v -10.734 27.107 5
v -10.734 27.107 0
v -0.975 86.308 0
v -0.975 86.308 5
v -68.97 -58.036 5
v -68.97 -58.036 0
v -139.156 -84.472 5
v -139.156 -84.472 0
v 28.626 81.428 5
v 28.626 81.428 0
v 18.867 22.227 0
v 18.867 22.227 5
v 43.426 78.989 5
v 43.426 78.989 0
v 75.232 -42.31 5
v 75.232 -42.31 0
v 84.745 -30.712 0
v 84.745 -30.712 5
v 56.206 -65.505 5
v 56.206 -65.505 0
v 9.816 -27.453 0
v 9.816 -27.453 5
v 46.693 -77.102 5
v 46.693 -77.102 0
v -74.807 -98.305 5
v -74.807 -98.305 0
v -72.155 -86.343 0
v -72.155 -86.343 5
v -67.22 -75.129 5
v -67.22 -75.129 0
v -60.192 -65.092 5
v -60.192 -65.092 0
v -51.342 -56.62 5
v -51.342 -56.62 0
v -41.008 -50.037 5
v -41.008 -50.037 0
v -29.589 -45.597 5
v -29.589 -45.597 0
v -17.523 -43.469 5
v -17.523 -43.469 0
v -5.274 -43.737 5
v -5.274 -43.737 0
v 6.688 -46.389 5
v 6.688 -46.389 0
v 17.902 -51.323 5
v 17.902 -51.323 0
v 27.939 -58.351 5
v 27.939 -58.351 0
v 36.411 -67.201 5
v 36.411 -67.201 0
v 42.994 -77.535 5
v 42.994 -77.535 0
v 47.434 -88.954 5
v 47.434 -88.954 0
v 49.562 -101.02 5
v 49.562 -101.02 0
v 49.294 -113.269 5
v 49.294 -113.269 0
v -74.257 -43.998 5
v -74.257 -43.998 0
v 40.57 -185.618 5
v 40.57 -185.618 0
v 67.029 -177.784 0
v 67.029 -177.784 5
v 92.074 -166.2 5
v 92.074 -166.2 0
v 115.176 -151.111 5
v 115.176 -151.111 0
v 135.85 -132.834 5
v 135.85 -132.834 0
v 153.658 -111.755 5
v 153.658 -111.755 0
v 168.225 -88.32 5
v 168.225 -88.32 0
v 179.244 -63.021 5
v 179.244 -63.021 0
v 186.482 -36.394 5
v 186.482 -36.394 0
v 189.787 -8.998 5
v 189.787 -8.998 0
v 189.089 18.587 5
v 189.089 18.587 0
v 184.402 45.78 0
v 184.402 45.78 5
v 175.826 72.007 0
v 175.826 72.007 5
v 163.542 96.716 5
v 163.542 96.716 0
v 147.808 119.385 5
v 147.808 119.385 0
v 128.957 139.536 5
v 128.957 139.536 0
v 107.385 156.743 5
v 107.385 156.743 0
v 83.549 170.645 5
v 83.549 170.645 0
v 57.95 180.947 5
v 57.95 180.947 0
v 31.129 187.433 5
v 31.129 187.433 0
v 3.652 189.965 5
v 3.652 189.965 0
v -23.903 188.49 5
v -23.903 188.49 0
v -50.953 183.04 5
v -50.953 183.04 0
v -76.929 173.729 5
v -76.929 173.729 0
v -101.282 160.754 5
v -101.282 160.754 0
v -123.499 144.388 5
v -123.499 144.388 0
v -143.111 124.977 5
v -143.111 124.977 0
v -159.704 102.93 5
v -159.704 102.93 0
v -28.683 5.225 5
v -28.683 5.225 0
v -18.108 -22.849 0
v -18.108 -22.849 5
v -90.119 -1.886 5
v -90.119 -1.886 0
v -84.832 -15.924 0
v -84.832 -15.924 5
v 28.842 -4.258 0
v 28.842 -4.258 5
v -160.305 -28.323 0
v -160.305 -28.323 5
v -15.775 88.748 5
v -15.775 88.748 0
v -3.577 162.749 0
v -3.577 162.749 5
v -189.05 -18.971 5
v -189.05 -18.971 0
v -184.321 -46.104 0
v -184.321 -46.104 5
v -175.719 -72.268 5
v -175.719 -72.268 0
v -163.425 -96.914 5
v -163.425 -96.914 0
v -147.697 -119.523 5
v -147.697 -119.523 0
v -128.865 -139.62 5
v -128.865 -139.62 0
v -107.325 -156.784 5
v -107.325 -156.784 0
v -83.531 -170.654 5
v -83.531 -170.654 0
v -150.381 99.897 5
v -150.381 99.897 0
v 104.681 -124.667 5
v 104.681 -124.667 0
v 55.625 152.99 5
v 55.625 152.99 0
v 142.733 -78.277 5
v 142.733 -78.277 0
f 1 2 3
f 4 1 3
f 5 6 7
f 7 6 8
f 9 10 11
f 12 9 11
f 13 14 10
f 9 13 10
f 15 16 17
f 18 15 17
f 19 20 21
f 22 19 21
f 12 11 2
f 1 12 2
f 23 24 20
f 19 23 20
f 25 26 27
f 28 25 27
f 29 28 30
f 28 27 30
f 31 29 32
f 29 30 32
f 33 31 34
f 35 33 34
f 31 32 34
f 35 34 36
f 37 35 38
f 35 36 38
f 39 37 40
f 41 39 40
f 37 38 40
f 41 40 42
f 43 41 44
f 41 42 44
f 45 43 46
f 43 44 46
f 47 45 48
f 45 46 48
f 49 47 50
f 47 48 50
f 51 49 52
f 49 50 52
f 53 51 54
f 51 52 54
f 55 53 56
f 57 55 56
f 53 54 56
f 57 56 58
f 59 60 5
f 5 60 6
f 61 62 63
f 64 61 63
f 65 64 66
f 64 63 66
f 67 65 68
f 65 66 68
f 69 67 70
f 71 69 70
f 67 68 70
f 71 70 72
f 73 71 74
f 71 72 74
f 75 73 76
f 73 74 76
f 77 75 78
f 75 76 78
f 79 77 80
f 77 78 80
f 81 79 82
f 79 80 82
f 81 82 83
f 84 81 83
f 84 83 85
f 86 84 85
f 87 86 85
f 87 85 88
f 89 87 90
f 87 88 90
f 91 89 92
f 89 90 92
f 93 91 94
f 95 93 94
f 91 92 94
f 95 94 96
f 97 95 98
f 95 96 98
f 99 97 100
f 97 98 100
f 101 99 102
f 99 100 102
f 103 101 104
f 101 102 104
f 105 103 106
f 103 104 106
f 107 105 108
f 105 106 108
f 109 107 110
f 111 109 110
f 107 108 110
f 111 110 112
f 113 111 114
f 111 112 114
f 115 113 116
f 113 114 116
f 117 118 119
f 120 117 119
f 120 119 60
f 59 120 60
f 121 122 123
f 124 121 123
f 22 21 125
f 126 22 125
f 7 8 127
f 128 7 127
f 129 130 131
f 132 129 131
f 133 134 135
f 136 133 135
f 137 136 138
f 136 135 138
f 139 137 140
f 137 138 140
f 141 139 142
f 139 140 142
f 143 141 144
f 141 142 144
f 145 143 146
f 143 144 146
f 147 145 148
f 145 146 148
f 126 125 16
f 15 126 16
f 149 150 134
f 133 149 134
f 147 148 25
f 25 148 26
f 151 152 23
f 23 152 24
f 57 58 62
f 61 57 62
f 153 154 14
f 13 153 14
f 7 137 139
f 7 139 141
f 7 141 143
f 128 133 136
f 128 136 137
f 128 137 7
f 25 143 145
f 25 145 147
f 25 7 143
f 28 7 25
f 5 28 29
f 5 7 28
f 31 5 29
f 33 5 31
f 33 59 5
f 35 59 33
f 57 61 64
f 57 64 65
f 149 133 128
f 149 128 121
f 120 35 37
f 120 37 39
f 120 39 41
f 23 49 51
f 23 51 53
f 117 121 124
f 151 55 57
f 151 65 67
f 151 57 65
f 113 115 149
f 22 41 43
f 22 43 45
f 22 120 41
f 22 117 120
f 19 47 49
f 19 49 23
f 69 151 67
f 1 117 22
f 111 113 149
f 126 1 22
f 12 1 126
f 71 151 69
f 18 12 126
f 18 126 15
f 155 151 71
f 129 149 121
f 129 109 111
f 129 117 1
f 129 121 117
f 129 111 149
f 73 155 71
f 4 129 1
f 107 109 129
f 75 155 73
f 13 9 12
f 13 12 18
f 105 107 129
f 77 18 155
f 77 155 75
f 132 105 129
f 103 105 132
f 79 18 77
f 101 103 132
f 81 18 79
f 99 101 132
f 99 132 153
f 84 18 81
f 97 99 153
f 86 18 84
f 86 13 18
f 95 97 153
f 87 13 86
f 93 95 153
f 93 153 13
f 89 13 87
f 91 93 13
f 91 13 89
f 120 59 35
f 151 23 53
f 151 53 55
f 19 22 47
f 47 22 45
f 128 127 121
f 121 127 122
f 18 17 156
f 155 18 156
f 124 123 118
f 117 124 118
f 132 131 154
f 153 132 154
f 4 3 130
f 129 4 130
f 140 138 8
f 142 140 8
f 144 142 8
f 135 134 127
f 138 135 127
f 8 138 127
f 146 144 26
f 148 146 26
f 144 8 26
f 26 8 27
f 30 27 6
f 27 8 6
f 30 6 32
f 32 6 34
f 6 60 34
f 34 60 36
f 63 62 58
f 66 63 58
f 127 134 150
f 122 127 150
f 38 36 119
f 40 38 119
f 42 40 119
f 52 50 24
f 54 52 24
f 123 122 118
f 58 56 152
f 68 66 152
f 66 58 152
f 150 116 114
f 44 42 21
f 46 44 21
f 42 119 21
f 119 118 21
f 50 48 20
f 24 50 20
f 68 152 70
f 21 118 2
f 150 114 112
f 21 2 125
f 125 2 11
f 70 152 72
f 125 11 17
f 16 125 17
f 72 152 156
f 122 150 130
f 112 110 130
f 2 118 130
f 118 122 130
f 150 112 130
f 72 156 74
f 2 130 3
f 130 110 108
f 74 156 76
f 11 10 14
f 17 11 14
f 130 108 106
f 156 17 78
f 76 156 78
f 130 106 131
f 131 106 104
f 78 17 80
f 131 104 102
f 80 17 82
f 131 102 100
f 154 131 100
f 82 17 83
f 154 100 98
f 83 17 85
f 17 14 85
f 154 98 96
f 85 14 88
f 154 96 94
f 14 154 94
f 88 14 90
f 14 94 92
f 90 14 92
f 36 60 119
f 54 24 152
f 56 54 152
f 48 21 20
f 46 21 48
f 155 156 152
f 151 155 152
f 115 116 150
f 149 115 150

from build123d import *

# Parameters (mm, degrees)
BOSS_EXTRUDE1_DEPTH = 5


with BuildPart() as part:
    # Sketch1 → Boss-Extrude1 (new body)
    with BuildSketch(Plane.XY):
        with BuildLine():
            Line((-83.530674823, -170.653527252), (-74.806628793, -98.304799508))
            ThreePointArc((-74.806628793, -98.304799508), (-5.273873885, -43.7365304), (49.294395236, -113.269285297))
            Line((49.294395236, -113.269285297), (40.570349206, -185.618013041))
            ThreePointArc((40.570349206, -185.618013041), (156.087114581, 108.336571211), (-159.704253129, 102.929837912))
            Line((-159.704253129, 102.929837912), (-150.380705265, 99.896734946))
            Line((-150.380705265, 99.896734946), (-189.050478899, -18.971463523))
            ThreePointArc((-189.050478899, -18.971463523), (-155.971098141, -108.503532406), (-83.530674823, -170.653527252))
        make_face()
        Polygon((-74.257311019, -43.998315425), (-68.970068444, -58.035589589), (-139.156439262, -84.471802466), (-160.305409564, -28.322705811), (-90.119038745, -1.886492934), (-84.83179617, -15.923767097), (-28.682699515, 5.225203205), (-18.108214364, -22.849345123), align=None, mode=Mode.SUBTRACT)
        Polygon((-0.975003372, 86.307875472), (-15.775260686, 88.747626167), (-3.576507208, 162.748912734), (55.624522046, 152.989909952), (43.425768568, 78.988623385), (28.625511255, 81.428374081), (18.866508473, 22.227344827), (-10.734006154, 27.106846218), align=None, mode=Mode.SUBTRACT)
        Polygon((75.232314391, -42.309560047), (84.745329129, -30.712036579), (142.73294647, -78.277110268), (104.680887518, -124.667204141), (46.693270177, -77.102130451), (56.206284915, -65.504606983), (9.816191042, -27.452548031), (28.842220518, -4.257501095), align=None, mode=Mode.SUBTRACT)
    extrude(amount=BOSS_EXTRUDE1_DEPTH)


solid = part.part
